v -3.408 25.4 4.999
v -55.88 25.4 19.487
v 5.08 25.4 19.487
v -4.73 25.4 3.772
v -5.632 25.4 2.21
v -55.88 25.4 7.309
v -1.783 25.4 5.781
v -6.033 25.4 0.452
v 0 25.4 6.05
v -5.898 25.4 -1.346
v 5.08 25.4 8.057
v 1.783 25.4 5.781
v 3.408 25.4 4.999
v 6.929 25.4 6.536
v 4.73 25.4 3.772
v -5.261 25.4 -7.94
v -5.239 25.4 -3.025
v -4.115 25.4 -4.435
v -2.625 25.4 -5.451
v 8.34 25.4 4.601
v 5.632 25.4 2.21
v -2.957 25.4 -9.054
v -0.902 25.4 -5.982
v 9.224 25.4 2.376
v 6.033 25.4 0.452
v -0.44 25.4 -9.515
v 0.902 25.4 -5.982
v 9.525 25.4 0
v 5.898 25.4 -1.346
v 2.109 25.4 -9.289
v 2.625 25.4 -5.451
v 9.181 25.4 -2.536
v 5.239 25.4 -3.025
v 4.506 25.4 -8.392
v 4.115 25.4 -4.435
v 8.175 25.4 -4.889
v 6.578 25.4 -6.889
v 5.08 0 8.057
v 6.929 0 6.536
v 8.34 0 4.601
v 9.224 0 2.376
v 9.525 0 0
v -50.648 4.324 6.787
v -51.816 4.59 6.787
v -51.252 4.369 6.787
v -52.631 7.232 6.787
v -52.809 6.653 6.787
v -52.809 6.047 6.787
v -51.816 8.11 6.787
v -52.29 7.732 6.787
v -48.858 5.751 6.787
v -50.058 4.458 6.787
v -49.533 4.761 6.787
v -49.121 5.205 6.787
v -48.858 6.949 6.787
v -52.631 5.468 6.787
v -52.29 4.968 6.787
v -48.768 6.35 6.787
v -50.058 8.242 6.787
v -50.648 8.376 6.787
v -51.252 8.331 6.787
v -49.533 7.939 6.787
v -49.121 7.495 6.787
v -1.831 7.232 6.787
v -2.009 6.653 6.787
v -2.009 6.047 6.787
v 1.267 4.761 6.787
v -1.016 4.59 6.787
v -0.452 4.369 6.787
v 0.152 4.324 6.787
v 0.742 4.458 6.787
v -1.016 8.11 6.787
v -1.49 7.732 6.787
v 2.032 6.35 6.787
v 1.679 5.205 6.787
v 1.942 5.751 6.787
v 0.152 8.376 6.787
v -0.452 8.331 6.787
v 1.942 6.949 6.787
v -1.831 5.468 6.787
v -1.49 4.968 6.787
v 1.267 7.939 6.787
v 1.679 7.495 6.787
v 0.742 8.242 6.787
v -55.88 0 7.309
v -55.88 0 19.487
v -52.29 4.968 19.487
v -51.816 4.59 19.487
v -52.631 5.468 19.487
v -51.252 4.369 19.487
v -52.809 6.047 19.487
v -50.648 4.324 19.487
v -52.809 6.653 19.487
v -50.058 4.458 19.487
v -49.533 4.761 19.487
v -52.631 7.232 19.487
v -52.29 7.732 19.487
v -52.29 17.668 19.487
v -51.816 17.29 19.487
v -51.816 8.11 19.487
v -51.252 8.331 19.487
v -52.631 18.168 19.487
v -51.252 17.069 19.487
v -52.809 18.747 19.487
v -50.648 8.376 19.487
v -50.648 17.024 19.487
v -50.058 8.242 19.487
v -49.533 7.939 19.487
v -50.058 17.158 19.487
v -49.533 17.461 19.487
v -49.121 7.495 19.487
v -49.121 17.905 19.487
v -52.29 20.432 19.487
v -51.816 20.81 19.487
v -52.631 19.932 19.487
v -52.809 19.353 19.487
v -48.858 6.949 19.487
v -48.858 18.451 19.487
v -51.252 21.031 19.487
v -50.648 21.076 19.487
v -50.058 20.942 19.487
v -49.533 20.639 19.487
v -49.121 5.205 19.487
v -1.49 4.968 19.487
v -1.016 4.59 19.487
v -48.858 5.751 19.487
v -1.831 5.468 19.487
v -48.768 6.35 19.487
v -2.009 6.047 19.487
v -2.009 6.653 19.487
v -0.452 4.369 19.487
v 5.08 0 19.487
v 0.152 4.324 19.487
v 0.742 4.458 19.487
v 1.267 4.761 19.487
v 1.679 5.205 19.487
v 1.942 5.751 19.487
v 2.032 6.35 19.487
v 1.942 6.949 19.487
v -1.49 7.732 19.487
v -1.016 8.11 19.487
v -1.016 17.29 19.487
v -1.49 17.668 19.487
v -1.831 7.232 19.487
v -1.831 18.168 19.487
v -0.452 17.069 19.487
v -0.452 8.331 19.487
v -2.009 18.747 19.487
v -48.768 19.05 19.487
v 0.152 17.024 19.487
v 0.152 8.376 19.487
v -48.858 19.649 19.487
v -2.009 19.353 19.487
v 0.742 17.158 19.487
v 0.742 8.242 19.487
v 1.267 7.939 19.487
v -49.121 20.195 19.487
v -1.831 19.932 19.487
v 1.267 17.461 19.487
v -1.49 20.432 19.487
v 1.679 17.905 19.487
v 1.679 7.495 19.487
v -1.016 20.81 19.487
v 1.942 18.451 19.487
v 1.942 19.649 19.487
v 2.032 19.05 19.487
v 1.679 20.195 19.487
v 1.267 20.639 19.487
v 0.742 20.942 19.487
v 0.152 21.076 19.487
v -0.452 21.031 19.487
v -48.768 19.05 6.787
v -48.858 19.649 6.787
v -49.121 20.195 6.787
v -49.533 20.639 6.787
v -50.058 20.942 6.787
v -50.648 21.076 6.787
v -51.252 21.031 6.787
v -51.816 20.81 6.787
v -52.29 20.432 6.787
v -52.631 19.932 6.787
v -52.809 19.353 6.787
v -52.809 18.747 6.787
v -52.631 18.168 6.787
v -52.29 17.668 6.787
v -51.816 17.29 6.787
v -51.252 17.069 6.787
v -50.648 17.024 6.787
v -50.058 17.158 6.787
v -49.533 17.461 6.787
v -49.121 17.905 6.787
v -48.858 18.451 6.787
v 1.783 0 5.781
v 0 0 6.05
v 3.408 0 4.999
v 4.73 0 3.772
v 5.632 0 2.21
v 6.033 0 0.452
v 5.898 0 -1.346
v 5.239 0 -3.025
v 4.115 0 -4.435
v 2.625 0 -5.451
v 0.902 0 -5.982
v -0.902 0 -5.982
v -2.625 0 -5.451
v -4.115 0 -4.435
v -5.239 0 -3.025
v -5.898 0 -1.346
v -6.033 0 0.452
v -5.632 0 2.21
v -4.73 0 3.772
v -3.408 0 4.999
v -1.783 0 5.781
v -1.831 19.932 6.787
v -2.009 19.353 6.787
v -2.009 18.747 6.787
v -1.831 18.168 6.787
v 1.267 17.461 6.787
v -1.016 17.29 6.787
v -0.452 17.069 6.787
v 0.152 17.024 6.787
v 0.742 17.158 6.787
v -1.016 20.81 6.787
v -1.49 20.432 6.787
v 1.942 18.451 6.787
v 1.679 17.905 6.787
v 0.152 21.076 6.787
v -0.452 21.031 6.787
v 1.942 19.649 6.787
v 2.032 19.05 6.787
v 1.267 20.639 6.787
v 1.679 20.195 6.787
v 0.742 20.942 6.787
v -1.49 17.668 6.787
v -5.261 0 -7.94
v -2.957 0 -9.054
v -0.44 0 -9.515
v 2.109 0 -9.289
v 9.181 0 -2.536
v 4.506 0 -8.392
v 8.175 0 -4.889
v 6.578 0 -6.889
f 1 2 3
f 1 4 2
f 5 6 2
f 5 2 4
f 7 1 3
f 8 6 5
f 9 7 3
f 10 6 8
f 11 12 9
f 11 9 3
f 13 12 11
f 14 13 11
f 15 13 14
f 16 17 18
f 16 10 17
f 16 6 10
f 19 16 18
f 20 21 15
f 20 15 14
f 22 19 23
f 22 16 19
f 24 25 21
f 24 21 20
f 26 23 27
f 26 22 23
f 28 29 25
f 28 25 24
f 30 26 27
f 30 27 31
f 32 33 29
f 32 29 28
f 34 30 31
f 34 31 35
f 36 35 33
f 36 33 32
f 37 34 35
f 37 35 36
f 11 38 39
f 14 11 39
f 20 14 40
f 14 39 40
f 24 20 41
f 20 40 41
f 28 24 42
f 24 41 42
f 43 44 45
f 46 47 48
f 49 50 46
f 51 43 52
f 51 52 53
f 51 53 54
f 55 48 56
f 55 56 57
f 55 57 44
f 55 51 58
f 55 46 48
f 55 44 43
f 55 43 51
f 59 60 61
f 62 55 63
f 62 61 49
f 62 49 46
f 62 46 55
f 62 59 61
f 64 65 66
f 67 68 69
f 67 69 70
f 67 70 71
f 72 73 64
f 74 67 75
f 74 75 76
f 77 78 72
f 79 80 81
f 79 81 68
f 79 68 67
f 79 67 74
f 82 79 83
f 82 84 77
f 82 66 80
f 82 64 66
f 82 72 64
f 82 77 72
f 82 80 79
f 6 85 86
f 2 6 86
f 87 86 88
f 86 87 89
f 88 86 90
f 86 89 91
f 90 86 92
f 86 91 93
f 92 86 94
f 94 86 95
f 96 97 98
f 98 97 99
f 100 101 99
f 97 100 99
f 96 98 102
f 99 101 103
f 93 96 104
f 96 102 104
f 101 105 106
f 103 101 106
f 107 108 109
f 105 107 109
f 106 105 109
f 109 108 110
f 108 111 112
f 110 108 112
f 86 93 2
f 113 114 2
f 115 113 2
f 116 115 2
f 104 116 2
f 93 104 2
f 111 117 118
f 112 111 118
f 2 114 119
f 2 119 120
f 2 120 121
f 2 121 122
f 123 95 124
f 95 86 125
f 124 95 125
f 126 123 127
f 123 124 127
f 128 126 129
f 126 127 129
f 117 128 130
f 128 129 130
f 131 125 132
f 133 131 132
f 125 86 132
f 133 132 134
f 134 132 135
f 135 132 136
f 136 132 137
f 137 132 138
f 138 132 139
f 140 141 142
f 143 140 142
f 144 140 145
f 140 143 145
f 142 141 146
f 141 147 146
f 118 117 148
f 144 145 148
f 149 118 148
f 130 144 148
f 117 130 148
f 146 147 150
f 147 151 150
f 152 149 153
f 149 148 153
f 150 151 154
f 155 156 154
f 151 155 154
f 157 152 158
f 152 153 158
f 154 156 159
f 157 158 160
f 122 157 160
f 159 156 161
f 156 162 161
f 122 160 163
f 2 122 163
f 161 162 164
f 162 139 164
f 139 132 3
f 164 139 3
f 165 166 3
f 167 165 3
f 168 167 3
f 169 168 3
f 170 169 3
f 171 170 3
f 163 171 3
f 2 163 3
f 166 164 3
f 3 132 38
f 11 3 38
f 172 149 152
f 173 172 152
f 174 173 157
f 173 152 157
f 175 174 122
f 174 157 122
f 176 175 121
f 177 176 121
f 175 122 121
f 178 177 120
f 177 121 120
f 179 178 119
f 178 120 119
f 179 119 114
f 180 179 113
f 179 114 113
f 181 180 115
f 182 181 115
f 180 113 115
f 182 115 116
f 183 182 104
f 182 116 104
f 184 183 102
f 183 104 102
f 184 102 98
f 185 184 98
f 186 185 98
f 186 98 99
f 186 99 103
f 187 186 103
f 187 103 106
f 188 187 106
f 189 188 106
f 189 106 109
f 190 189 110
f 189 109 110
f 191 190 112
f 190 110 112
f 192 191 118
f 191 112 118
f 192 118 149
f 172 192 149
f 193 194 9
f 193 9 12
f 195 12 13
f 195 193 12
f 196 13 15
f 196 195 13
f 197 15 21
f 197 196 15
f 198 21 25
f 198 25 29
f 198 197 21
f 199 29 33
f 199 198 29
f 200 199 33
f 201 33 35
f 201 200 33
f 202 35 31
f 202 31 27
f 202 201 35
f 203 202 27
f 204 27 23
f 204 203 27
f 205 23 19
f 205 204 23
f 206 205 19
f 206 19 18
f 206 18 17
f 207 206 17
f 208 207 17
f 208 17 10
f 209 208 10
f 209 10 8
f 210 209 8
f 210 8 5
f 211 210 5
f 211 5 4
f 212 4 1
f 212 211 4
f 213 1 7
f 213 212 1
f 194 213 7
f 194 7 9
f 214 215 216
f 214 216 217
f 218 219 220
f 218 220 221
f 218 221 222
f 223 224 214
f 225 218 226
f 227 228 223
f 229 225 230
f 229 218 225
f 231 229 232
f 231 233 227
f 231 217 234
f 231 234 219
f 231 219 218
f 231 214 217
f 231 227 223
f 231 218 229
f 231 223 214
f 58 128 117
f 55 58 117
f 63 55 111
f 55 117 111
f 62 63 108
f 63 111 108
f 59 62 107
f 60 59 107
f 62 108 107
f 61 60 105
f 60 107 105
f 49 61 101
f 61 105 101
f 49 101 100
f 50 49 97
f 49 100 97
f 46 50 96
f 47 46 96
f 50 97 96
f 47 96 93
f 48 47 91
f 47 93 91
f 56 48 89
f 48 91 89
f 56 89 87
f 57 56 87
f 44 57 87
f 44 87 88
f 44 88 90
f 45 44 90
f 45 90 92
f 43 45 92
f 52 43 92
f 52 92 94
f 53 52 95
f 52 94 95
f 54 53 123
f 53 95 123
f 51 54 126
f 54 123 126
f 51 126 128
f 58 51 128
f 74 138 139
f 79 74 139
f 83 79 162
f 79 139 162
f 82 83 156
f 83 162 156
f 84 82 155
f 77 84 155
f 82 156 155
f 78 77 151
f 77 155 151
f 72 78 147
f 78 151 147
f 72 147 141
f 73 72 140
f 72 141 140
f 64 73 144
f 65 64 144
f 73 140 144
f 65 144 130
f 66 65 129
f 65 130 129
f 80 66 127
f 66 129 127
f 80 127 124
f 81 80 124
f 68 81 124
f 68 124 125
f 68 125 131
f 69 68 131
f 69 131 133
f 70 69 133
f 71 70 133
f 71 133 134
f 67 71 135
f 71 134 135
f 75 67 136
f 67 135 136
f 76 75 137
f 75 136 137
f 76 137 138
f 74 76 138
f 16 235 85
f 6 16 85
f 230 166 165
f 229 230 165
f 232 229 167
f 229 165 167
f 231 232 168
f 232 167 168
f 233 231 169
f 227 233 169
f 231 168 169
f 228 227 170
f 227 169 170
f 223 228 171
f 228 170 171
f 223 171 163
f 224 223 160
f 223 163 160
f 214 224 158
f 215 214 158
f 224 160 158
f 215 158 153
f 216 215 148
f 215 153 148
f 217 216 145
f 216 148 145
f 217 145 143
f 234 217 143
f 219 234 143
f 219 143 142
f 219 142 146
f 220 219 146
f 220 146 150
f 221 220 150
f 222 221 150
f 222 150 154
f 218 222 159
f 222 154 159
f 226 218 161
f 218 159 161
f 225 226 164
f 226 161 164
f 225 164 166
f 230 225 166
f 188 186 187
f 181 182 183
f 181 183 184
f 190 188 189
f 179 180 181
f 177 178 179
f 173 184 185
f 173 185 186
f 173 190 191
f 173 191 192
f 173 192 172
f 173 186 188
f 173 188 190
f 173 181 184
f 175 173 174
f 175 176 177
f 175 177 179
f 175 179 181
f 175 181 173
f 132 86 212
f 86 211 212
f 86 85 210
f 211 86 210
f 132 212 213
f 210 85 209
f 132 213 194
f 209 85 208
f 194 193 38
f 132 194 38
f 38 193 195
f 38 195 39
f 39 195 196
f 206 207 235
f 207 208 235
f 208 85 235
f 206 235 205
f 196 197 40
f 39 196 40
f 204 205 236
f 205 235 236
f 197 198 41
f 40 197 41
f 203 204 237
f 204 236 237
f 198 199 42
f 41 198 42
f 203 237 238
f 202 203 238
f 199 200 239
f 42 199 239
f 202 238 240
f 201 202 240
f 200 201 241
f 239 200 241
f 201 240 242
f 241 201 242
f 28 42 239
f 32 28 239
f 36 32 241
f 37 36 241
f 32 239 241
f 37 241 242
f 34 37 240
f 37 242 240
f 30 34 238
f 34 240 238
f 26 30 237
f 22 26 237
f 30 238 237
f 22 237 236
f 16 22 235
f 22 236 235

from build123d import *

# Parameters (mm, degrees)
SKETCH1_W           = 10.16
SKETCH1_H           = 5.08
SKETCH1_R           = 6.049999965
BOSS_EXTRUDE1_DEPTH = 25.4
SKETCH6_W           = 11.43
SKETCH6_H           = 25.4
BOSS_EXTRUDE3_DEPTH = 50.8
CHAMFER2_DEPTH      = 25.4
SKETCH4_R           = 2.032
CUT_EXTRUDE2_DEPTH  = 12.7


with BuildPart() as part:
    # Sketch1 → Boss-Extrude1 (new body)
    # profile 1 of 4: a face of its own
    with BuildSketch(Plane(origin=(0, 0, 0), x_dir=(1, 0, 0), z_dir=(0, 1, 0))):
        with BuildLine():
            Line((-5.08, -8.057246738), (-5.08, -14.407246738))
            Line((-5.08, -14.407246738), (5.08, -14.407246738))
            Line((5.08, -14.407246738), (5.08, -8.057246738))
            ThreePointArc((5.08, -8.057246738), (0, -9.525), (-5.08, -8.057246738))
        make_face()
    # profile 2 of 4: a face of its own
    with BuildSketch(Plane(origin=(0, 0, 0), x_dir=(1, 0, 0), z_dir=(0, 1, 0))):
        with Locations((0, -16.947246738)):
            Rectangle(SKETCH1_W, SKETCH1_H)
    # profile 3 of 4: a face of its own
    with BuildSketch(Plane(origin=(0, 0, 0), x_dir=(1, 0, 0), z_dir=(0, 1, 0))):
        with BuildLine():
            ThreePointArc((9.525, 0), (-4.601012117, 8.340042716), (-5.08, -8.057246738))
            Line((-5.08, -8.057246738), (5.08, -8.057246738))
            ThreePointArc((5.08, -8.057246738), (8.340042716, -4.601012117), (9.525, 0))
        make_face()
        with Locations(Location((0, 0, 0), (0, 0, 270))):
            Circle(SKETCH1_R, mode=Mode.SUBTRACT)
    # profile 4 of 4: a face of its own
    with BuildSketch(Plane(origin=(0, 0, 0), x_dir=(1, 0, 0), z_dir=(0, 1, 0))):
        with BuildLine():
            Line((5.08, -8.057246738), (-5.08, -8.057246738))
            ThreePointArc((-5.08, -8.057246738), (0, -9.525), (5.08, -8.057246738))
        make_face()
    extrude(amount=BOSS_EXTRUDE1_DEPTH)

    # Sketch6 → Boss-Extrude3 (add)
    with BuildSketch(Plane.ZY.offset(5.08)):
        with Locations((13.772246738, 12.7)):
            Rectangle(SKETCH6_W, SKETCH6_H)
    extrude(amount=BOSS_EXTRUDE3_DEPTH)

    # Chamfer2: read off the stored shape, not the designer's step
    # Chamfer2 outline → Chamfer2 (add)
    with BuildSketch(Plane(origin=(0, 0, 0), x_dir=(1, 0, 0), z_dir=(0, 1, 0))):
        with BuildLine():
            Line((-5.261303905, 7.940044472), (-55.88, -7.308719642))
            Line((-55.88, -7.308719642), (-55.88, -8.057246738))
            Line((-55.88, -8.057246738), (-5.08, -8.057246738))
            ThreePointArc((-5.08, -8.057246738), (-9.524388334, -0.107943825), (-5.261303905, 7.940044472))
        make_face()
    extrude(amount=CHAMFER2_DEPTH)

    # Sketch4 → Cut-Extrude2 (cut)
    with BuildSketch(Plane.XY.offset(19.487246738)):
        with Locations((0, 19.05)):
            Circle(SKETCH4_R)
        with Locations((0, 6.35)):
            Circle(SKETCH4_R)
        with Locations((-50.8, 19.05)):
            Circle(SKETCH4_R)
        with Locations((-50.8, 6.35)):
            Circle(SKETCH4_R)
    extrude(amount=-CUT_EXTRUDE2_DEPTH, mode=Mode.SUBTRACT)


solid = part.part
